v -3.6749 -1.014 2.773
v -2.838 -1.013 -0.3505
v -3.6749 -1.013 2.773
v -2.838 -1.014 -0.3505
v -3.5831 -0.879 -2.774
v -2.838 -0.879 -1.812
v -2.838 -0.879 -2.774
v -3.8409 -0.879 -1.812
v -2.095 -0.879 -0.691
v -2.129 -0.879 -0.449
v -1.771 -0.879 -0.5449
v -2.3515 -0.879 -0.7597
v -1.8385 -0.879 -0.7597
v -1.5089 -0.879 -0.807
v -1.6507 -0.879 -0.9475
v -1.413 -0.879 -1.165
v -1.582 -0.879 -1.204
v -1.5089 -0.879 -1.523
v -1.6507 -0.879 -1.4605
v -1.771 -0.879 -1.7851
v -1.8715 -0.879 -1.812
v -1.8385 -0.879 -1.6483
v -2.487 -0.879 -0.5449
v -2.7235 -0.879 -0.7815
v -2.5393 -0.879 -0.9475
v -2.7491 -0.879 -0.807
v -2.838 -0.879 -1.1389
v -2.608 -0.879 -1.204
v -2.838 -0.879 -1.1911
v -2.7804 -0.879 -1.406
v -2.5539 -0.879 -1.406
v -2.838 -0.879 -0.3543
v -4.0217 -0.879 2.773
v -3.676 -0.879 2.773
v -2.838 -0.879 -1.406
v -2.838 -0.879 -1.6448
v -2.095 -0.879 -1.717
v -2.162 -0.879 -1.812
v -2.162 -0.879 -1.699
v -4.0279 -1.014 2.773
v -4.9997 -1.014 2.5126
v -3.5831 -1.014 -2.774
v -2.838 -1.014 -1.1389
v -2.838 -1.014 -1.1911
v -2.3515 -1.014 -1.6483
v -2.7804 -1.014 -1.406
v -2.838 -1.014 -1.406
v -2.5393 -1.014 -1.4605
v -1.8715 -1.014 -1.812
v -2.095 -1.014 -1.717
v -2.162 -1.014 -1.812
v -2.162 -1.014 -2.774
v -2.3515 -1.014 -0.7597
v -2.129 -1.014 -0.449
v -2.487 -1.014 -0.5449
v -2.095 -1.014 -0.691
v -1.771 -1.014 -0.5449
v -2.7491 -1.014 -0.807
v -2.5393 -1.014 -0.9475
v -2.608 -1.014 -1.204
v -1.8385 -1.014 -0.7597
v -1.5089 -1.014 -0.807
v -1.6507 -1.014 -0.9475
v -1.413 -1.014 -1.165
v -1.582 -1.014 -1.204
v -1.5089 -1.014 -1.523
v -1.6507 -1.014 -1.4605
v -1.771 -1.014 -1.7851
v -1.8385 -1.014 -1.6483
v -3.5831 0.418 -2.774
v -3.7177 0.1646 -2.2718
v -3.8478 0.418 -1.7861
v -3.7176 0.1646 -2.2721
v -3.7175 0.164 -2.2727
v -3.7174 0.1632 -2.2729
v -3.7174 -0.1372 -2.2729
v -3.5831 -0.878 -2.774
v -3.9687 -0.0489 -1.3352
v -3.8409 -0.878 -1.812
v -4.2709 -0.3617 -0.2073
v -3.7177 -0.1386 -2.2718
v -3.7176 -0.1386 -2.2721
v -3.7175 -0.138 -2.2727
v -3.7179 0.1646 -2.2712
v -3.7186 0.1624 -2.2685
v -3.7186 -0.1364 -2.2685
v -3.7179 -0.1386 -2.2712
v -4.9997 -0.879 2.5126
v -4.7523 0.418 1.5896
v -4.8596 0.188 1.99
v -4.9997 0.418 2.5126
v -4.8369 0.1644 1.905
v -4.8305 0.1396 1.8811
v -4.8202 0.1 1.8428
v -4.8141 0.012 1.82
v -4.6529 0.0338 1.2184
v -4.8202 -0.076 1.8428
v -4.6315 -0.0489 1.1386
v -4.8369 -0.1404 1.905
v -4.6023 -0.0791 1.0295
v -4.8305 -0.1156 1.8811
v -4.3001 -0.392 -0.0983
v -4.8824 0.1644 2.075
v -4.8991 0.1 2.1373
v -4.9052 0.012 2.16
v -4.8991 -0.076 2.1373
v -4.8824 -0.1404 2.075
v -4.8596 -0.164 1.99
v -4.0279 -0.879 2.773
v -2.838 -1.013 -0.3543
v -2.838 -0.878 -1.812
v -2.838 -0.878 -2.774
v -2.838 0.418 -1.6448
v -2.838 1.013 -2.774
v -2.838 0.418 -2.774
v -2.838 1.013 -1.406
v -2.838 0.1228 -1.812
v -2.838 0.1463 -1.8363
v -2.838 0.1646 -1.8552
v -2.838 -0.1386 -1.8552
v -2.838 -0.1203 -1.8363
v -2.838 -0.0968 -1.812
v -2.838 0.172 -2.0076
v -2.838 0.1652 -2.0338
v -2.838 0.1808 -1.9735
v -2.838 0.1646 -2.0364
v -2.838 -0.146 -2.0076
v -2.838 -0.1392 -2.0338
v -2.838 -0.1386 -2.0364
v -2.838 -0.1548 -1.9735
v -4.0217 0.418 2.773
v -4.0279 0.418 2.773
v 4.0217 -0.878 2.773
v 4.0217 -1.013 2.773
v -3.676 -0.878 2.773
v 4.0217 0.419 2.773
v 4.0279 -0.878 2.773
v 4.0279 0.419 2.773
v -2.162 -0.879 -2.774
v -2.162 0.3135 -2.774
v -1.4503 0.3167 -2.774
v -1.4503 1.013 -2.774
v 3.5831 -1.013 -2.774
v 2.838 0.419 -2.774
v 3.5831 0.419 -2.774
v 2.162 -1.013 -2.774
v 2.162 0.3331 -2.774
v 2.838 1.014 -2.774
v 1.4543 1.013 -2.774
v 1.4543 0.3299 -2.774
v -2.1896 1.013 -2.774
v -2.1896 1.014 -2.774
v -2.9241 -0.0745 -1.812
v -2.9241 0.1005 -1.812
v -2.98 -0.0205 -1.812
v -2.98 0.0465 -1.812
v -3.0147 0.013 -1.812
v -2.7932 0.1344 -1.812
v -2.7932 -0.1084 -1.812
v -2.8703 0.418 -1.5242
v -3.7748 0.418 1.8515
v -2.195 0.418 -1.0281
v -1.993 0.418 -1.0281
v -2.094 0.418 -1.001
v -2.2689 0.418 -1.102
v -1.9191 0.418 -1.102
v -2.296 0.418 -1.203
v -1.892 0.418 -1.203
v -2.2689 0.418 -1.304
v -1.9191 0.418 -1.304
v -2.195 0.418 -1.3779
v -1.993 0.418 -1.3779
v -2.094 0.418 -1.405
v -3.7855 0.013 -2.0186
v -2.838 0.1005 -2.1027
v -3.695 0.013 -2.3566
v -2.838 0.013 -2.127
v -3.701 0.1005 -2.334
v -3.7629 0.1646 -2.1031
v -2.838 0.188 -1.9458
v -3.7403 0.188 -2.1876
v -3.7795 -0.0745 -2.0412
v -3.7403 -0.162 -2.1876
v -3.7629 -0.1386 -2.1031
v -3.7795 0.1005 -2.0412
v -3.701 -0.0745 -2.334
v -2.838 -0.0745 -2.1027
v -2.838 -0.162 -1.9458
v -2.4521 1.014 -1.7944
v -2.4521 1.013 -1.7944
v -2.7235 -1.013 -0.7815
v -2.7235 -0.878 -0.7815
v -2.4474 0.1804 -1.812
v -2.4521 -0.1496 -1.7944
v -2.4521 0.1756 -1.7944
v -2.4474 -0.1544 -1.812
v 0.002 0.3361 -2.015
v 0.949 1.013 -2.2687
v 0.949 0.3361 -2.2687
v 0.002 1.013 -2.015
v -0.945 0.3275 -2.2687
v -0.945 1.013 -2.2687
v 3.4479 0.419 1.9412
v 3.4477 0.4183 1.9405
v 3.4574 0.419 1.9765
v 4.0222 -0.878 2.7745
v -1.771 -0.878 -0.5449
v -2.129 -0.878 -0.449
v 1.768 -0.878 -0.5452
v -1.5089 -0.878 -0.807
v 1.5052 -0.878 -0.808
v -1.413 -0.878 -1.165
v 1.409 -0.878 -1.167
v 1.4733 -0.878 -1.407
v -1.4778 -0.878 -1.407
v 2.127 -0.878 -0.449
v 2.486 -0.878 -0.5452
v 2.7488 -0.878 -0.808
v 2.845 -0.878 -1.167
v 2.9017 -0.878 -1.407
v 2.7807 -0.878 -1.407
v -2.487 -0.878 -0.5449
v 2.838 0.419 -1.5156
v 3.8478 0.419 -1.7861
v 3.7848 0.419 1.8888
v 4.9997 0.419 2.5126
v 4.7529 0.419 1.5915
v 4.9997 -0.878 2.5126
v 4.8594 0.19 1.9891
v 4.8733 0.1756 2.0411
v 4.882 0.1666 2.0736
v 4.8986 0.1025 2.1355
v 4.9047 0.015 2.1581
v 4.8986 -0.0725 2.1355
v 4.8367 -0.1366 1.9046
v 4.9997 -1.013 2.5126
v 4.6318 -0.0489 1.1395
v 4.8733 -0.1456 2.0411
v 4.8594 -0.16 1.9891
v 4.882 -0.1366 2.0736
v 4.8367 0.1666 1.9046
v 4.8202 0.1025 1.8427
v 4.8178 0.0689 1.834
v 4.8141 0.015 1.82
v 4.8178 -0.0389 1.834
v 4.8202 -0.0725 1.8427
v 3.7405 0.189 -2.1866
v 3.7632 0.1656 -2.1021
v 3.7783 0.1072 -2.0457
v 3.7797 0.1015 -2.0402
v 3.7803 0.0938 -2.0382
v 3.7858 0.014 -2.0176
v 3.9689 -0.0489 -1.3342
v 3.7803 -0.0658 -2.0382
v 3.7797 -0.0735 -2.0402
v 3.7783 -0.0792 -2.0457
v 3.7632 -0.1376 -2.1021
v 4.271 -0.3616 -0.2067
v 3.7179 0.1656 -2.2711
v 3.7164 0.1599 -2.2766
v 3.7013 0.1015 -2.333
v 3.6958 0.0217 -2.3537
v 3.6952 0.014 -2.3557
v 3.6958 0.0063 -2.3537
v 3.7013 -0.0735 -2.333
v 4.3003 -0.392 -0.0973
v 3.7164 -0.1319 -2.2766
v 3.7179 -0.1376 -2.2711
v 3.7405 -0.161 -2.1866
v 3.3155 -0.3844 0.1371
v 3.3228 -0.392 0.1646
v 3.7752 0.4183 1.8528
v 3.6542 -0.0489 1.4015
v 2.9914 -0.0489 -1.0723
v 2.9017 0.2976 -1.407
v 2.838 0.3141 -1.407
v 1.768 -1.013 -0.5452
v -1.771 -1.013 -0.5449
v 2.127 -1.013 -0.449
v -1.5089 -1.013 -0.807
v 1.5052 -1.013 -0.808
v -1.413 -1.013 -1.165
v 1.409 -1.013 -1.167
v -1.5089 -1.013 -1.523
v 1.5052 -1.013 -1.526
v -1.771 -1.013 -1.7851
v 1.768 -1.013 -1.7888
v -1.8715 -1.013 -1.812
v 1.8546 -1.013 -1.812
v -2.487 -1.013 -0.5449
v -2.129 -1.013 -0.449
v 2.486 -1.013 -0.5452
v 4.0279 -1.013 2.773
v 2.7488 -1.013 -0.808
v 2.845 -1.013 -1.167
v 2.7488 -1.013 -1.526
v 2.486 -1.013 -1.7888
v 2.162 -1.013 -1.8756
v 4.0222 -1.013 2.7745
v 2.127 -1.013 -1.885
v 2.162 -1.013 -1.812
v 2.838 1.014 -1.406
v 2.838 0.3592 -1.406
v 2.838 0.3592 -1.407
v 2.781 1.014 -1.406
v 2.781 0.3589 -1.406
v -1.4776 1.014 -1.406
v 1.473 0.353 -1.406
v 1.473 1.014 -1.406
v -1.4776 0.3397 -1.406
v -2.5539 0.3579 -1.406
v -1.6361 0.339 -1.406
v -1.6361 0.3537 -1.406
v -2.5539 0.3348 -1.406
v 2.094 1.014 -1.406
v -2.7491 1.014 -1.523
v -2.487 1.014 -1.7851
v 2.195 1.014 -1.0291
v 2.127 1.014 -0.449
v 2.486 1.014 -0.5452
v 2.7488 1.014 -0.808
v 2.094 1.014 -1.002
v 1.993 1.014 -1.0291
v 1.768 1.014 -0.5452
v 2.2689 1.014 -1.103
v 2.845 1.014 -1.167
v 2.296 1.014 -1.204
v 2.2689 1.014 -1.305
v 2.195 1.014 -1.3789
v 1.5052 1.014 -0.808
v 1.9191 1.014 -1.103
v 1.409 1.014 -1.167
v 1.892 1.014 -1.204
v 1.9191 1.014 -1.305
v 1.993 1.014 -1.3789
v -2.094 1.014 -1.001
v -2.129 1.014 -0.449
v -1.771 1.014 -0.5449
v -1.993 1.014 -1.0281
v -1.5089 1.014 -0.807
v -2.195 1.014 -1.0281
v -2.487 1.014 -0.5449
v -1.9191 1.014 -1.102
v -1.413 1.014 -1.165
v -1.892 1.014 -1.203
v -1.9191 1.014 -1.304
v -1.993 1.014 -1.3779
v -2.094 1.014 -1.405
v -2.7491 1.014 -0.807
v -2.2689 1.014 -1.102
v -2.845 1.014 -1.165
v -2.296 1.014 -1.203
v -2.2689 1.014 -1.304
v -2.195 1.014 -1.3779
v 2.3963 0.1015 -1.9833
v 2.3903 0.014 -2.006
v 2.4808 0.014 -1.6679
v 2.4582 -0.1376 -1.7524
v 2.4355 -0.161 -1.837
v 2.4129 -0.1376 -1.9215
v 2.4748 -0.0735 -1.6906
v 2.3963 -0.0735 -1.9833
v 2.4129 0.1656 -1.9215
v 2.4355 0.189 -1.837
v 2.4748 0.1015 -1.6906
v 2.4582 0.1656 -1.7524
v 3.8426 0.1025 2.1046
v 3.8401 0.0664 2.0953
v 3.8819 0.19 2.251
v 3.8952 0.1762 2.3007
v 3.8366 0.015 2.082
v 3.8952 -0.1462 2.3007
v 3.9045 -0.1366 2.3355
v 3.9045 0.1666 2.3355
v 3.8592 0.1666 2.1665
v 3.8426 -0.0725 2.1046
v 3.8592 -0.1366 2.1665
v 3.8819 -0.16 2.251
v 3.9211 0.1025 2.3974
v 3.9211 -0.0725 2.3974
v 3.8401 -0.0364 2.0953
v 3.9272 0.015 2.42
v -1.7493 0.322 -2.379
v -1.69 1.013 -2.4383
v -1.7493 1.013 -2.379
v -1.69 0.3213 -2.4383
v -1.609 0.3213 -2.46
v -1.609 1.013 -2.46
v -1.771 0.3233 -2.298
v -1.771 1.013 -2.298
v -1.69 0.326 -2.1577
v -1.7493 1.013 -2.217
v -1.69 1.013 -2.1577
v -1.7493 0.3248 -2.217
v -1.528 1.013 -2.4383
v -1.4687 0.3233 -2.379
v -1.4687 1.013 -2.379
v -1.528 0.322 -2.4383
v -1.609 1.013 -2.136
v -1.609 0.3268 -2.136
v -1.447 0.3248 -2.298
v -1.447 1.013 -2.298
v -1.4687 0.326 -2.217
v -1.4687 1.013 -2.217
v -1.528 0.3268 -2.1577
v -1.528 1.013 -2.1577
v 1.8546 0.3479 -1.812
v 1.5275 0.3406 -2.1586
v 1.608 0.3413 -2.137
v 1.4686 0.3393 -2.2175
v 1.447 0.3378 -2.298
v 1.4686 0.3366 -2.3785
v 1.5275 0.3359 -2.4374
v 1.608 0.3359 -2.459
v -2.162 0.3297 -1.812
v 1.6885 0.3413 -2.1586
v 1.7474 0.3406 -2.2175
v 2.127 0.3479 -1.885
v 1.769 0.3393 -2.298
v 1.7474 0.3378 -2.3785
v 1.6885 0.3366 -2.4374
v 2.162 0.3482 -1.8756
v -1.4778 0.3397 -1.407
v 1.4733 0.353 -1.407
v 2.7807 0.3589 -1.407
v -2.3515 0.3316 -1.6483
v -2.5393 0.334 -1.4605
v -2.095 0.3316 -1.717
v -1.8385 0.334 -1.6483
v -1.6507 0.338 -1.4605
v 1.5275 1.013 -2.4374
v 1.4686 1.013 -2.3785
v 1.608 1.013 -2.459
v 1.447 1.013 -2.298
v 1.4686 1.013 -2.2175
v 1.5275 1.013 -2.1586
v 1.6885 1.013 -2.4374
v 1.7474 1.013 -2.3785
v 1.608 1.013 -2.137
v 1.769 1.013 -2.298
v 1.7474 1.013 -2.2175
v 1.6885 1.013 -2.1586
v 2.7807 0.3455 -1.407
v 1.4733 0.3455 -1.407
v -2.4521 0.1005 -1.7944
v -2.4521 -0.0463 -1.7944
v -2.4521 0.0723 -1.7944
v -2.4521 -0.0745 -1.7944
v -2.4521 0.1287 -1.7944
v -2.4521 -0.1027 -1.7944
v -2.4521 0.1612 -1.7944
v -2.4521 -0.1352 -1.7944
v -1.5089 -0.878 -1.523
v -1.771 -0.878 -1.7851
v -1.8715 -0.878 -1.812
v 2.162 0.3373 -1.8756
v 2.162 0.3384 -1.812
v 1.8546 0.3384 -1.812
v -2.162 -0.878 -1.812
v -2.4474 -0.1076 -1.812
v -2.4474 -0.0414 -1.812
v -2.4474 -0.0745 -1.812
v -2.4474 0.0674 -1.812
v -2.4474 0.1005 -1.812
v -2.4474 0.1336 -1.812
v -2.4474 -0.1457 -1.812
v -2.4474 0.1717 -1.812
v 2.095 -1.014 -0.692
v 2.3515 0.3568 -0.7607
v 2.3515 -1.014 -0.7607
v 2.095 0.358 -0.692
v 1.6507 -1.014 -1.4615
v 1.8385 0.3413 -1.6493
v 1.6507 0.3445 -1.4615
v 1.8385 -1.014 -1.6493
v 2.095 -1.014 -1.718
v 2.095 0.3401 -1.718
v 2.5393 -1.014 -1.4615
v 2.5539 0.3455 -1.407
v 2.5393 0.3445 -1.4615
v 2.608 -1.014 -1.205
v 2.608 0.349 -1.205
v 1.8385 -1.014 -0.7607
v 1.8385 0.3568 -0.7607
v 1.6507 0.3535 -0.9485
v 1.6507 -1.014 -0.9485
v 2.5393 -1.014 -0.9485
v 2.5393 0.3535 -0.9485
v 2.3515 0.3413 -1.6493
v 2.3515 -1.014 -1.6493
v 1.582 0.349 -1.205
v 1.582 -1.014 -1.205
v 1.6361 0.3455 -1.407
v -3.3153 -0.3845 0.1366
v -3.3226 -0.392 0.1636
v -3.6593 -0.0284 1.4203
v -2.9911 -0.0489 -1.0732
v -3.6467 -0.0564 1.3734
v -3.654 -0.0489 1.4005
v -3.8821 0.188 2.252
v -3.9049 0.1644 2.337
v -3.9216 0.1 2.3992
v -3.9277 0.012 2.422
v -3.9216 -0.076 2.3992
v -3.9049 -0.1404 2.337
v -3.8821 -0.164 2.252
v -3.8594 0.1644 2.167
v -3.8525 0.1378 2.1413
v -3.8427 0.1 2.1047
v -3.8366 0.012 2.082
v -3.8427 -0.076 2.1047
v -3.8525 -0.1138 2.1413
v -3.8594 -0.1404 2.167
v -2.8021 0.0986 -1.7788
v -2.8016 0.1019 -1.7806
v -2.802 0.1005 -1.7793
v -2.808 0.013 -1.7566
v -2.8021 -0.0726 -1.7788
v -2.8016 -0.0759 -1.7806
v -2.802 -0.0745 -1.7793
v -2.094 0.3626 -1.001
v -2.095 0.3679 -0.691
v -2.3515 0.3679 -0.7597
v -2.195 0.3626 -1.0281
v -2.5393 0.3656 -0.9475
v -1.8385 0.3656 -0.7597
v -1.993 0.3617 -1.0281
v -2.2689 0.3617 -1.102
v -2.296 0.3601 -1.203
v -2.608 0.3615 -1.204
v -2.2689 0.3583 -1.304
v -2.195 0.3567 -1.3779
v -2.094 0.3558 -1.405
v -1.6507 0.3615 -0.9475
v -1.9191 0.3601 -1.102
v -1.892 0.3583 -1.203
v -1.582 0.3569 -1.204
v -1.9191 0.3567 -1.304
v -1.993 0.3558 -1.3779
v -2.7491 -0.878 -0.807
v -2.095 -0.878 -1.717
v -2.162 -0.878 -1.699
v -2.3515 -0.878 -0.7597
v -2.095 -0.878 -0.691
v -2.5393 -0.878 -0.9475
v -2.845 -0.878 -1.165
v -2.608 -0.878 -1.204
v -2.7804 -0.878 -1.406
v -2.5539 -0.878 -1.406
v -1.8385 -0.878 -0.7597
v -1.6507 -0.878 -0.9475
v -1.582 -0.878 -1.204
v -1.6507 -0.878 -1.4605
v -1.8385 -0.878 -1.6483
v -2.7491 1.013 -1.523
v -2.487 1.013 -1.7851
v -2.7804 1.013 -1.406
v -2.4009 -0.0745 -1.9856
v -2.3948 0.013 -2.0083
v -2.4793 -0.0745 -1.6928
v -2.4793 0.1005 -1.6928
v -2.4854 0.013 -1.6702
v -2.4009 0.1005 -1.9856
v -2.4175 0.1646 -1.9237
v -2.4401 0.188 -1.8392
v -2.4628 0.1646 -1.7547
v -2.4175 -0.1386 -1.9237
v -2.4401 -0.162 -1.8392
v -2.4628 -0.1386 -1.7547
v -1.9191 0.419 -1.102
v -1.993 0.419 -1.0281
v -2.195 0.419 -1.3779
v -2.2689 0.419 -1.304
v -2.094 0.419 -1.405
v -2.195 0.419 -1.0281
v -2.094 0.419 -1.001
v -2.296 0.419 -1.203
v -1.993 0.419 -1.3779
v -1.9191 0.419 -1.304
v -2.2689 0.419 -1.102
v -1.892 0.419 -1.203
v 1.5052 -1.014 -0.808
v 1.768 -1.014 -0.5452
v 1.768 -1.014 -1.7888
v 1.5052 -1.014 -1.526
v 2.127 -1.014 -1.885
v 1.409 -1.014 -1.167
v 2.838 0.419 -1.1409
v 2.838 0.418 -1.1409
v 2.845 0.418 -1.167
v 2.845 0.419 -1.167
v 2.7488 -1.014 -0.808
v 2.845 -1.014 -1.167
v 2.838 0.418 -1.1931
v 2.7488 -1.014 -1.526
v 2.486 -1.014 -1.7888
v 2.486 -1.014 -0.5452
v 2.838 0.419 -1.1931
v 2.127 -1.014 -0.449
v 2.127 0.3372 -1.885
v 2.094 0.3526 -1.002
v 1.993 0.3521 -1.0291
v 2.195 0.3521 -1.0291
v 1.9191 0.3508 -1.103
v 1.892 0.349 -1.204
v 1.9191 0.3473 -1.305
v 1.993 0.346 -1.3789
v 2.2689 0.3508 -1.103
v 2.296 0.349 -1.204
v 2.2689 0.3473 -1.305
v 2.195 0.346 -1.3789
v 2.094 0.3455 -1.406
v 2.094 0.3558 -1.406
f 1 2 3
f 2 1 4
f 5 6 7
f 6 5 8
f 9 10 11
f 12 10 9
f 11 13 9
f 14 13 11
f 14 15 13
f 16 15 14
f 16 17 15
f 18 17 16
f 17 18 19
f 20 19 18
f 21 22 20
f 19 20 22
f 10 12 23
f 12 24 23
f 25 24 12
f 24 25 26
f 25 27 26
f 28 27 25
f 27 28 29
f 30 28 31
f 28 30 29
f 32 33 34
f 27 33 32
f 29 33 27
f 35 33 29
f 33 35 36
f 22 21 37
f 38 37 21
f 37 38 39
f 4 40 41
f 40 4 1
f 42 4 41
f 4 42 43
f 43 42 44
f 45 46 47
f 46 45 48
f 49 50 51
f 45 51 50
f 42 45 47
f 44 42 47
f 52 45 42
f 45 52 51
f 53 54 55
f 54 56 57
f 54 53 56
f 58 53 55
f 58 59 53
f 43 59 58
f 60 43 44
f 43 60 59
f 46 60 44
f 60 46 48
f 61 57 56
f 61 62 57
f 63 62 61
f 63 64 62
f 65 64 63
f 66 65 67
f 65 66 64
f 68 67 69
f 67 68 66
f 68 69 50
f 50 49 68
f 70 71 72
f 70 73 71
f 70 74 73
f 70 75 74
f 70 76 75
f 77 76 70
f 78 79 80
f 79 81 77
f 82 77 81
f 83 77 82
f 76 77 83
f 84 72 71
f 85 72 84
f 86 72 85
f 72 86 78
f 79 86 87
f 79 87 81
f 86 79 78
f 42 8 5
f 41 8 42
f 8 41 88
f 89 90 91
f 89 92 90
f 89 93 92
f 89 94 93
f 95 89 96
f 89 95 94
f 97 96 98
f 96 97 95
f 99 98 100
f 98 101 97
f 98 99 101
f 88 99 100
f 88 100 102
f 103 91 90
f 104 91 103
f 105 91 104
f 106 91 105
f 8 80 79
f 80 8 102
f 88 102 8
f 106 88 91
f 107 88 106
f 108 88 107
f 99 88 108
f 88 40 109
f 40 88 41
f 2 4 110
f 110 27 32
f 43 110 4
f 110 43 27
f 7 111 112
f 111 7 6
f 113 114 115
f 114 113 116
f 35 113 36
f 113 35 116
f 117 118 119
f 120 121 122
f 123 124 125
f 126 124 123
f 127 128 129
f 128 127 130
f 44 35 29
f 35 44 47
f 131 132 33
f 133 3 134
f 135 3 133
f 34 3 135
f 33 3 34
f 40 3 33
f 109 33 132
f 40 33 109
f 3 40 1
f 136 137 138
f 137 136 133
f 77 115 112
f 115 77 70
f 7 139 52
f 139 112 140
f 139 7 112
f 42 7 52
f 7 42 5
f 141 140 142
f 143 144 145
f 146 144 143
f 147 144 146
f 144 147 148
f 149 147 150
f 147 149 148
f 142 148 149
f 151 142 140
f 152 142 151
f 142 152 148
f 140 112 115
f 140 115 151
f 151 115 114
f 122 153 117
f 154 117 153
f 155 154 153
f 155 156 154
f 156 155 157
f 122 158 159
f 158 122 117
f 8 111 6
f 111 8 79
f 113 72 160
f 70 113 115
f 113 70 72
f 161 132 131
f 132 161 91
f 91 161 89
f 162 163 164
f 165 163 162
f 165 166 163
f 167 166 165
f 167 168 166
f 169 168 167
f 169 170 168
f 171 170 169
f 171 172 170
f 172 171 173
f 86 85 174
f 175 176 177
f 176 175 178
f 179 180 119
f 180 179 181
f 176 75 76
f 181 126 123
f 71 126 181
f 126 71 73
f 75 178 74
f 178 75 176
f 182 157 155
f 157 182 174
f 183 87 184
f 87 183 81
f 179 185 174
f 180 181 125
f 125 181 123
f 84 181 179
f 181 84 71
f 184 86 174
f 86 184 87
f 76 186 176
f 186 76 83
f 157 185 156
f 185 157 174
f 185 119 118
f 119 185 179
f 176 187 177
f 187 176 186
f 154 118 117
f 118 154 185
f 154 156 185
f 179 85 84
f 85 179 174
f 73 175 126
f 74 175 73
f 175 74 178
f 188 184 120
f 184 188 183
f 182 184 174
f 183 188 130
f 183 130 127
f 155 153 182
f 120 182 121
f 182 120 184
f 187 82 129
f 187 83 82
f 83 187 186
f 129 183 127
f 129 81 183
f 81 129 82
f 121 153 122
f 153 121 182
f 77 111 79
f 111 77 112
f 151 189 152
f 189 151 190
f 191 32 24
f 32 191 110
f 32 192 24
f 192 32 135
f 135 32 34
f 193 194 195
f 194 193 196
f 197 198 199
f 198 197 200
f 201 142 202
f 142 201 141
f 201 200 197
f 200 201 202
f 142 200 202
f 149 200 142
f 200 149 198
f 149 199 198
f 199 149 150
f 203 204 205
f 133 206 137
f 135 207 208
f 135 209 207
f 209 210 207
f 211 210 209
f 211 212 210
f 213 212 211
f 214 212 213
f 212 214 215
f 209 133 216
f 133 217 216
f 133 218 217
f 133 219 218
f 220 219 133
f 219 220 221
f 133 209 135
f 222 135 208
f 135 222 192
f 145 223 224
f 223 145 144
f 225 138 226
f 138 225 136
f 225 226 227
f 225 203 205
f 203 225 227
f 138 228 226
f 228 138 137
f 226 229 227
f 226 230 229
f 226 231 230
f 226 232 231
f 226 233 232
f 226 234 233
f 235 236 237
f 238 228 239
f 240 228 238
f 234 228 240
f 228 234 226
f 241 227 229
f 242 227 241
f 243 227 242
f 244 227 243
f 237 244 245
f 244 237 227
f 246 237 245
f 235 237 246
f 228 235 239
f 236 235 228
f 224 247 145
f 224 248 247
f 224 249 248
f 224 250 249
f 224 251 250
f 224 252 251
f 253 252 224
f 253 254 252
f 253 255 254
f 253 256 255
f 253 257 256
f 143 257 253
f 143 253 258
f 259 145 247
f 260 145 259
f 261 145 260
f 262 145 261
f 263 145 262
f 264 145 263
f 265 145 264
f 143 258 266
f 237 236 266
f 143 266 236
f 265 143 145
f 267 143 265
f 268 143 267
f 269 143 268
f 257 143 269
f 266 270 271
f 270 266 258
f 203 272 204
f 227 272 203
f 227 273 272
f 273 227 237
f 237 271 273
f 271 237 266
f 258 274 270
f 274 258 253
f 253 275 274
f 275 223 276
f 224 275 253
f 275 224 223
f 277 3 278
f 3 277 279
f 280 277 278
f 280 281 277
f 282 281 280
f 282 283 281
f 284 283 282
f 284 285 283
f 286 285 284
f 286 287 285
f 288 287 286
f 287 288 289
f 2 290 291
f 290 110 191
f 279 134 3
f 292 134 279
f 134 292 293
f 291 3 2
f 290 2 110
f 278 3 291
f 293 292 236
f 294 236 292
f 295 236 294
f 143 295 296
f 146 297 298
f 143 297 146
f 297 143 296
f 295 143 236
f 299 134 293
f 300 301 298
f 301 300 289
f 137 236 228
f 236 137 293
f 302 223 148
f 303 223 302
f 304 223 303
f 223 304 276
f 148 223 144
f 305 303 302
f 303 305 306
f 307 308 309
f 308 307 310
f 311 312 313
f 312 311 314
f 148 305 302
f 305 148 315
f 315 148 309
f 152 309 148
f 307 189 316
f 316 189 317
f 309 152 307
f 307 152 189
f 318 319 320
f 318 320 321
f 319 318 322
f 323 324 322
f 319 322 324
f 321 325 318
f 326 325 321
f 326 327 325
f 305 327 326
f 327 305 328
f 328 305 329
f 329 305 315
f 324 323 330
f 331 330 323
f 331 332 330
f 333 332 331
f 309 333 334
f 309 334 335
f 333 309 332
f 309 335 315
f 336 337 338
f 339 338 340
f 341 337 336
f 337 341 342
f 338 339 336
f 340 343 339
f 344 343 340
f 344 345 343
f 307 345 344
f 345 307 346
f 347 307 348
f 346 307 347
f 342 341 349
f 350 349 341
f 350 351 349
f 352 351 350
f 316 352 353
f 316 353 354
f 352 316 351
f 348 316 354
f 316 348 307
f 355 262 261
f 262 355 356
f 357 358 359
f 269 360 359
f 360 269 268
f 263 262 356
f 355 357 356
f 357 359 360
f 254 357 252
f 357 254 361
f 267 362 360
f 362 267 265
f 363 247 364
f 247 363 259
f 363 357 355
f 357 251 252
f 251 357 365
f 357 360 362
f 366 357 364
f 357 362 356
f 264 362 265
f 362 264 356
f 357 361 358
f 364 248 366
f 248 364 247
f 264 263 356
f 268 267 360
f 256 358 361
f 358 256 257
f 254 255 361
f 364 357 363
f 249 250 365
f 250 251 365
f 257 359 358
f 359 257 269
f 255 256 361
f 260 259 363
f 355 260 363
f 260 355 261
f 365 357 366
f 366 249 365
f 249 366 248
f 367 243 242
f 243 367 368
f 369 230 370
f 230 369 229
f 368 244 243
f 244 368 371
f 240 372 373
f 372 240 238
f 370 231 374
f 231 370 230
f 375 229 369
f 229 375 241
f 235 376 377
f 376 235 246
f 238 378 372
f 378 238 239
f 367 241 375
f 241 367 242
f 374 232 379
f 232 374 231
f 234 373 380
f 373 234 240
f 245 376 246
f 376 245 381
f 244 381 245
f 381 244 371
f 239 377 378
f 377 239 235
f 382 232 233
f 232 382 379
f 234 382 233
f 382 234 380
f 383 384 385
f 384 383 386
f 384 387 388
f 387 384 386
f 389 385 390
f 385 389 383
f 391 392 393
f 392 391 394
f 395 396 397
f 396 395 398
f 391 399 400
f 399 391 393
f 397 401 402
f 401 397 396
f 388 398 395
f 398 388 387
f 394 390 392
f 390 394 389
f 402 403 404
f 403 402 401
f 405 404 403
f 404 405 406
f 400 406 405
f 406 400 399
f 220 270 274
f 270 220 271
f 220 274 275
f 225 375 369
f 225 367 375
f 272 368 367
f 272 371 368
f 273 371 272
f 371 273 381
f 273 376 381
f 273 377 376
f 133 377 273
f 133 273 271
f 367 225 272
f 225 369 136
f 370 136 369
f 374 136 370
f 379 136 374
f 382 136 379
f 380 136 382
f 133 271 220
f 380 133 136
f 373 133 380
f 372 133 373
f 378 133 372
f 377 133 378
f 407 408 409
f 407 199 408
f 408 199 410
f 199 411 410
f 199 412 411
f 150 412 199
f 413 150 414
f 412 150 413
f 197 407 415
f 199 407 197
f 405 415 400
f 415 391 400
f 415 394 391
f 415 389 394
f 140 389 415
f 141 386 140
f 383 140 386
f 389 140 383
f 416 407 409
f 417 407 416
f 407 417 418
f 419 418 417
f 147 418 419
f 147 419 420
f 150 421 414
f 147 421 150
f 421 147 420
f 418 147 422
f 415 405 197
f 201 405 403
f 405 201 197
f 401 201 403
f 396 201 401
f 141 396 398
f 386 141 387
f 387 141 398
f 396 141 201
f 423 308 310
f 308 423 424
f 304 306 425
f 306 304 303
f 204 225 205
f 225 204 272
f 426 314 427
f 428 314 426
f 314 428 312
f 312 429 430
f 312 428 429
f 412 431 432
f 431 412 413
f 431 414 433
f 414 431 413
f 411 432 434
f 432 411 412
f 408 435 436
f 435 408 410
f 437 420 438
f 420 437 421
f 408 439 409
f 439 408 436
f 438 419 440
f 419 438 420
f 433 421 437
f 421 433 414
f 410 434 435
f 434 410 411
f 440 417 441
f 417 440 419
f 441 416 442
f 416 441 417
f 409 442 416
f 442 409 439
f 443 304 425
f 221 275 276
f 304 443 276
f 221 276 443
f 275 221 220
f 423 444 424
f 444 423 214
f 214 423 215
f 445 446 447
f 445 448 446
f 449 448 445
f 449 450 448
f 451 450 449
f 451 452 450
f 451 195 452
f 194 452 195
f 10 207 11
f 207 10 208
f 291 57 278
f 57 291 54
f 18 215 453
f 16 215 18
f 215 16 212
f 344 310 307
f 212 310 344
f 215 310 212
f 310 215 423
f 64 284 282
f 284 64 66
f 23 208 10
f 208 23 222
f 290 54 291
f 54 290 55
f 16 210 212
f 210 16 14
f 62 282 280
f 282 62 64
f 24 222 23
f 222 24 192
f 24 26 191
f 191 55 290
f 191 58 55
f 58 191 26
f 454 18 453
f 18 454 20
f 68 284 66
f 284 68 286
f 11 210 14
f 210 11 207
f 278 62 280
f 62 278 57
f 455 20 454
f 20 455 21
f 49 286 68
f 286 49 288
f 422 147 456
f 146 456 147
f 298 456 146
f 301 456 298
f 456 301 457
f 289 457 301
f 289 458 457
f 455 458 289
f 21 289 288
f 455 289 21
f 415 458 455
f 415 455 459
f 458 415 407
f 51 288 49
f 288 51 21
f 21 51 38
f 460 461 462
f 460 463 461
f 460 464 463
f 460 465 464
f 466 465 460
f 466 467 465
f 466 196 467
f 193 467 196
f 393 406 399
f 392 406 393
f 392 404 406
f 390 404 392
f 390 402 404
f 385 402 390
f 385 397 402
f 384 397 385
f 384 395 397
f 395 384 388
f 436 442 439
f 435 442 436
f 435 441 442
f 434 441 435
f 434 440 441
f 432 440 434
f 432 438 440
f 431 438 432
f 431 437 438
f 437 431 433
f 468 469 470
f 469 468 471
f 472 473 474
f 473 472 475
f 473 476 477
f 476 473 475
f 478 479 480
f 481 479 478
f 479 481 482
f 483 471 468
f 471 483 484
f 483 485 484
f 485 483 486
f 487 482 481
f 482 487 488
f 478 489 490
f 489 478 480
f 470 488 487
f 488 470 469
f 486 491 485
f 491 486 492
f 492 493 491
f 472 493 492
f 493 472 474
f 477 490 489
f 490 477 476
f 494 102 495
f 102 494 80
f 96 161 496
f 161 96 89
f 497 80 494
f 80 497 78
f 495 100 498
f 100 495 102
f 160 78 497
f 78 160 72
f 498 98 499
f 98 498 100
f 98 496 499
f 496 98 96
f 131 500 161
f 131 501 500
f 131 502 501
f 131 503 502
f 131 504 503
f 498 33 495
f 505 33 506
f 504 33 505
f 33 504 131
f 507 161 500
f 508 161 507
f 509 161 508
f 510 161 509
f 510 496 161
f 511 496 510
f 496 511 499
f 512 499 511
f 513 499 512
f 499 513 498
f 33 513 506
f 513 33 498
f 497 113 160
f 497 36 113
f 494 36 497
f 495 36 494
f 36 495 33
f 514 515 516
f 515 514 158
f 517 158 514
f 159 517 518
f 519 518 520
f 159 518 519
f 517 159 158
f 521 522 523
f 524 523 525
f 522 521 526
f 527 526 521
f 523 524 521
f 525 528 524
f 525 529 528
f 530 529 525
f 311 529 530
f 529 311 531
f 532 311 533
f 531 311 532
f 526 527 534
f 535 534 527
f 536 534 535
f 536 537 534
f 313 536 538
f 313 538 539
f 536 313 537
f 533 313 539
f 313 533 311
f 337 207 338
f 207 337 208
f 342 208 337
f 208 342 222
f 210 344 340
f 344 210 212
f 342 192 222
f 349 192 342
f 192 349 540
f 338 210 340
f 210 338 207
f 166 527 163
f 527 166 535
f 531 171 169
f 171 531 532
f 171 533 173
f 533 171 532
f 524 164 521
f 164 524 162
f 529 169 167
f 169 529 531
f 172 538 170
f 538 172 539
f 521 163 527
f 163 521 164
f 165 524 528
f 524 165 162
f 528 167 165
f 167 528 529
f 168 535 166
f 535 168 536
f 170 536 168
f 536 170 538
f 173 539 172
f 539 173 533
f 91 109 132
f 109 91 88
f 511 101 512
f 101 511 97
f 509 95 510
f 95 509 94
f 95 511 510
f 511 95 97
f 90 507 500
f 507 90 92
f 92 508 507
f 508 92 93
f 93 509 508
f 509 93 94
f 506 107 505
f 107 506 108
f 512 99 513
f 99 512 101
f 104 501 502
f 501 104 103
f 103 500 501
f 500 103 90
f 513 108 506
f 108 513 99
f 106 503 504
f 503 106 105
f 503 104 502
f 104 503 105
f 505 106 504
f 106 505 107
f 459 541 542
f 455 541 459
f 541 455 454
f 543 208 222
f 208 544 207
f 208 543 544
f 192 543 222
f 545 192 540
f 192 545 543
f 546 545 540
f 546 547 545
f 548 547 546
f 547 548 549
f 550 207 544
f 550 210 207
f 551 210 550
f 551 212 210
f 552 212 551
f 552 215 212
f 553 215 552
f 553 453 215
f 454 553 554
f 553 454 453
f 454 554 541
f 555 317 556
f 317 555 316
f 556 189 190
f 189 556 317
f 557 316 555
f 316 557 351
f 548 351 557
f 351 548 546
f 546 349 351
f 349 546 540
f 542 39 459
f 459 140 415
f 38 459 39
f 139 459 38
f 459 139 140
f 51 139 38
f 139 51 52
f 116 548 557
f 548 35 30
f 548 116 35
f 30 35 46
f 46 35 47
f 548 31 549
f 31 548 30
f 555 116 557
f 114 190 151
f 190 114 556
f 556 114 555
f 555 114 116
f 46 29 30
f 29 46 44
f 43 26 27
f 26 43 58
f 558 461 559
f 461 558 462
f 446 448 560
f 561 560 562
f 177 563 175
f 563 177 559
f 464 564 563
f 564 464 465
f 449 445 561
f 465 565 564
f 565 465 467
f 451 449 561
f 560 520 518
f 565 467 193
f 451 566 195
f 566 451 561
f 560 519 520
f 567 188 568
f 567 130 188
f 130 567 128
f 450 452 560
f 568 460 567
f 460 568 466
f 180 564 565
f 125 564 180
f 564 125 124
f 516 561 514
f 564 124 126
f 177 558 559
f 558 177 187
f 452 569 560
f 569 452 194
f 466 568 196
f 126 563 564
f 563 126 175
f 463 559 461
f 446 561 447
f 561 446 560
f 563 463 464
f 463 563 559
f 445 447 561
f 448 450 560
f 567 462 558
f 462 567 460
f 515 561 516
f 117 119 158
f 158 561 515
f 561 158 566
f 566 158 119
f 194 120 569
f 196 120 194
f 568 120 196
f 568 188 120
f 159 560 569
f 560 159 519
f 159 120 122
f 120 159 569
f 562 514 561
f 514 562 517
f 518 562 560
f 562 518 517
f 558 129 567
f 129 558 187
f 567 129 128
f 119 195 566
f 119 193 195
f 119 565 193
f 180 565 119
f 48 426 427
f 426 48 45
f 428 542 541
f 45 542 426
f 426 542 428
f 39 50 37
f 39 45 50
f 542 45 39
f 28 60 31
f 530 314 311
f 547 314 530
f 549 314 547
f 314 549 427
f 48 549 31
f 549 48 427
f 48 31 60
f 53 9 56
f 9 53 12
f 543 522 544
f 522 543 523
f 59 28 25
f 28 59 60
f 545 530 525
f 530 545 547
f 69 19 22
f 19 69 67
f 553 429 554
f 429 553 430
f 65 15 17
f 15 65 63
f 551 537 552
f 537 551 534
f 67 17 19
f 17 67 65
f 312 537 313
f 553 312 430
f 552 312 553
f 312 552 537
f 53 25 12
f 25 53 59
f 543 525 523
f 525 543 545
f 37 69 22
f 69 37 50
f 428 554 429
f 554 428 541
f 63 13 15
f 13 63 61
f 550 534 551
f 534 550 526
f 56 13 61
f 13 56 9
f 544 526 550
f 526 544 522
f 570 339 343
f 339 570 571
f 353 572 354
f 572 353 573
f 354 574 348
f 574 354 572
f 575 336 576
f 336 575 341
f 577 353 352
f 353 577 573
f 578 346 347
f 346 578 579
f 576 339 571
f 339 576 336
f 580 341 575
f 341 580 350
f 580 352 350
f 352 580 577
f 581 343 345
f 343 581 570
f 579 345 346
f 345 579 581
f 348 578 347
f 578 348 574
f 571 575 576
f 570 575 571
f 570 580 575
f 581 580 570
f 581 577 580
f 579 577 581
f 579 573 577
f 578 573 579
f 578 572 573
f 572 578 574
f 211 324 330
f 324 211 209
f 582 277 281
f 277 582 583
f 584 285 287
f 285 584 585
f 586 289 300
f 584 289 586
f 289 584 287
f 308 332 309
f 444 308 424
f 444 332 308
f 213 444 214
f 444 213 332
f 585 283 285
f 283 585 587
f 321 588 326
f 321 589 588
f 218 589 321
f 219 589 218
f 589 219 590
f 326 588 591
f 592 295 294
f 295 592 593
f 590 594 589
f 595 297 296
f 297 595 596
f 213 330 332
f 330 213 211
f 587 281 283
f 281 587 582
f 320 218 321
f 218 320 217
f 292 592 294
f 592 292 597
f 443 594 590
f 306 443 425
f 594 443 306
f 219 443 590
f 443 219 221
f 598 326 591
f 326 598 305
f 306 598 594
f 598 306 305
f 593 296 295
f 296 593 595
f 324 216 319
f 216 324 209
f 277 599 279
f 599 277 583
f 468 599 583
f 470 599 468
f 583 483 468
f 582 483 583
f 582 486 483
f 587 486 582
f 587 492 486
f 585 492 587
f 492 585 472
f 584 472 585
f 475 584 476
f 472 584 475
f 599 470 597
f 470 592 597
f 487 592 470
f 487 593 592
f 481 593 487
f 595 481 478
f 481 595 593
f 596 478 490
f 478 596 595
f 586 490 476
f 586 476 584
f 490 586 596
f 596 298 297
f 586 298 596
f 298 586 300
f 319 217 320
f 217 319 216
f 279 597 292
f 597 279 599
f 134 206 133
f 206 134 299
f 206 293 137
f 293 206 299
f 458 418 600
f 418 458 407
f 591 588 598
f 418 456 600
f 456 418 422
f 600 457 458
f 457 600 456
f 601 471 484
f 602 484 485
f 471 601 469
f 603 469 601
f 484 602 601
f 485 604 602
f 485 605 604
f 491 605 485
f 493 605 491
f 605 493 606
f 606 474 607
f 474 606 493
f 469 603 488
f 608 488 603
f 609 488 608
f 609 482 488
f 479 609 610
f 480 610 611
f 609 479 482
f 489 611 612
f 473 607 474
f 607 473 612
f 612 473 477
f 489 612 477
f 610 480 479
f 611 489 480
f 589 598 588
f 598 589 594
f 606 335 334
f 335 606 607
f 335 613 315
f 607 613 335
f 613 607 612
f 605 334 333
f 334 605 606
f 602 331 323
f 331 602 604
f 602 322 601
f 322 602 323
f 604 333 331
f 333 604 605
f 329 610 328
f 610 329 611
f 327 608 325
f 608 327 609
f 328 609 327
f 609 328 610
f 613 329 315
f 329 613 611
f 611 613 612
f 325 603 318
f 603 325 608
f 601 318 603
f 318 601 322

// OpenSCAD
intersection() {
translate([-6, -1.216, -3.329]) cube(size = [12, 2.432, 6.658], center = false);
union() {
intersection() {
union() {
intersection() {
difference() {
rotate([-90, -15, 0])
translate([-4.179, -3.721, -1.014]) cube(size = [1.347, 21.821, 0.135], center = false);
rotate([179, 0, 0])
translate([-2.838, -0.37, -18.1]) cube(size = [0.676, 18.47, 36.2], center = false);
}
union() {
translate([-2.162, -1.013, -18.1]) cube(size = [20.262, 19.114, 16.288], center = false);
translate([-18.1, -18.1, -2.774]) cube(size = [15.938, 19.114, 5.547], center = false);
}
}
difference() {
difference() {
translate([-18.1, -1.014, -2.774]) cube(size = [15.262, 1.432, 0.962], center = false);
rotate([0, 75, 0])
translate([1.145, 0.013, -4.179])
cylinder(h = 1.347, r1 = 0.175, r2 = 0.175, center = false, $fn = 12);
}
difference() {
translate([-18.1, -1.014, -2.774]) cube(size = [36.2, 1.432, 5.547], center = false);
rotate([-90, -15, 0])
translate([-4.179, -3.721, -0.878]) cube(size = [1.347, 21.821, 1.297], center = false);
}
}
}
translate([-18.1, -18.1, -2.774]) cube(size = [36.2, 36.2, 5.547], center = false);
}
difference() {
intersection() {
difference() {
rotate([-91, -15, 0])
translate([-2.833, -18.1, -18.1]) cube(size = [20.933, 36.2, 36.2], center = false);
rotate([180, 90, -90])
translate([3.909, -0.002, -1.014])
cylinder(h = 2.027, r1 = 1.894, r2 = 1.894, center = false, $fn = 12);
}
union() {
rotate([90, 15, 0])
translate([-18.1, -18.1, 0.878]) cube(size = [22.279, 21.821, 0.135], center = false);
translate([-18.1, -0.878, -2.774]) cube(size = [20.938, 1.892, 1.368], center = false);
difference() {
rotate([90, 15, 0])
translate([2.828, -18.1, -0.419]) cube(size = [1.351, 21.821, 1.297], center = false);
rotate([180, 75, 180])
translate([-1.019, 2.169, 2.828])
cylinder(h = 15.272, r1 = 2.561, r2 = 2.561, center = false, $fn = 12);
}
}
difference() {
translate([-18.1, -18.1, -2.774]) cube(size = [36.2, 36.2, 5.547], center = false);
rotate([180, 75, 180])
translate([1.144, 0.014, 2.828])
cylinder(h = 15.272, r1 = 0.175, r2 = 0.175, center = false, $fn = 12);
}
}
intersection() {
union() {
rotate([180, 75, 180])
translate([-3.179, 0.015, -18.1])
cylinder(h = 36.2, r1 = 0.175, r2 = 0.175, center = false, $fn = 12);
rotate([180, 90, -90])
translate([2.298, 1.609, -0.878])
cylinder(h = 18.978, r1 = 0.162, r2 = 0.162, center = false, $fn = 12);
rotate([89, 15, 0])
translate([-18.1, -18.1, -0.37]) cube(size = [21.267, 36.2, 18.47], center = false);
rotate([180, 90, -90])
translate([2.298, -1.608, -0.878])
cylinder(h = 18.978, r1 = 0.161, r2 = 0.161, center = false, $fn = 12);
}
union() {
translate([-18.1, -0.878, -1.407]) cube(size = [36.2, 1.892, 4.18], center = false);
rotate([180, 90, -90])
translate([1.165, 2.129, -18.1])
cylinder(h = 36.2, r1 = 0.716, r2 = 0.716, center = false, $fn = 12);
translate([-18.1, -1.014, -2.774]) cube(size = [20.262, 2.027, 0.962], center = false);
rotate([180, 90, -90])
translate([1.205, -2.095, -18.1])
cylinder(h = 19.114, r1 = 0.513, r2 = 0.513, center = false, $fn = 12);
}
}
}
intersection() {
difference() {
translate([-18.1, -1.014, -1.812]) cube(size = [36.2, 1.432, 4.585], center = false);
rotate([0, 75, 0])
translate([-1.018, 2.169, -18.1])
cylinder(h = 15.267, r1 = 2.561, r2 = 2.561, center = false, $fn = 12);
}
union() {
rotate([-90, -15, 0])
translate([-4.179, -18.1, -1.014]) cube(size = [1.012, 36.2, 1.432], center = false);
rotate([-91, -15, 0])
translate([-2.833, -18.1, 0.37]) cube(size = [20.933, 36.2, 17.73], center = false);
}
union() {
difference() {
rotate([180, 90, -90])
translate([1.165, 2.129, -0.878])
cylinder(h = 18.978, r1 = 0.716, r2 = 0.716, center = false, $fn = 12);
rotate([180, 90, -90])
translate([1.203, 2.094, -18.1])
cylinder(h = 18.519, r1 = 0.202, r2 = 0.202, center = false, $fn = 12);
}
difference() {
rotate([-90, -15, 0])
translate([-4.179, -3.721, -1.014]) cube(size = [1.012, 21.821, 1.432], center = false);
rotate([0, 75, 0])
translate([-3.18, 0.012, -18.1])
cylinder(h = 36.2, r1 = 0.176, r2 = 0.176, center = false, $fn = 12);
}
}
}
difference() {
union() {
translate([-2.838, -1.014, -2.774]) cube(size = [0.676, 2.027, 1.368], center = false);
rotate([180, 90, -90])
translate([1.165, 2.129, -1.014])
cylinder(h = 0.135, r1 = 0.716, r2 = 0.716, center = false, $fn = 12);
difference() {
rotate([180, 90, -90])
translate([1.165, 2.129, -0.878])
cylinder(h = 1.892, r1 = 0.716, r2 = 0.716, center = false, $fn = 12);
translate([-2.162, -0.878, -2.774]) cube(size = [20.262, 1.297, 0.962], center = false);
}
}
union() {
rotate([0, 75, 0])
translate([1.145, 0.013, -18.1])
cylinder(h = 15.267, r1 = 0.175, r2 = 0.175, center = false, $fn = 12);
translate([-2.162, -1.014, -2.774]) cube(size = [20.262, 0.135, 0.962], center = false);
rotate([180, 90, -90])
translate([1.204, 2.095, -1.014])
cylinder(h = 1.432, r1 = 0.513, r2 = 0.513, center = false, $fn = 12);
rotate([180, 90, -90])
translate([1.203, 2.094, 0.419])
cylinder(h = 0.595, r1 = 0.202, r2 = 0.202, center = false, $fn = 12);
}
}
difference() {
union() {
rotate([180, 90, -90])
translate([1.167, -2.127, -1.014])
cylinder(h = 1.432, r1 = 0.718, r2 = 0.718, center = false, $fn = 12);
rotate([90, 15, 0])
translate([3.167, -18.1, 0.878]) cube(size = [1.012, 21.821, 0.135], center = false);
}
union() {
translate([-18.1, -1.013, -18.1]) cube(size = [36.2, 19.114, 16.693], center = false);
rotate([180, 90, -90])
translate([1.205, -2.095, -1.014])
cylinder(h = 1.432, r1 = 0.513, r2 = 0.513, center = false, $fn = 12);
}
}
difference() {
intersection() {
rotate([180, 90, -90])
translate([1.167, -2.127, -0.878])
cylinder(h = 1.297, r1 = 0.718, r2 = 0.718, center = false, $fn = 12);
rotate([179, 0, 0])
translate([-18.1, -18.1, -18.1]) cube(size = [36.2, 17.73, 36.2], center = false);
rotate([179, 0, 0])
translate([-18.1, -18.1, -18.1]) cube(size = [20.938, 17.73, 36.2], center = false);
}
difference() {
intersection() {
rotate([180, 90, -90])
translate([1.205, -2.095, -18.1])
cylinder(h = 19.114, r1 = 0.513, r2 = 0.513, center = false, $fn = 12);
rotate([180, 90, -90])
translate([1.204, -2.094, -0.878])
cylinder(h = 18.978, r1 = 0.202, r2 = 0.202, center = false, $fn = 12);
}
translate([2.162, -0.878, -18.1]) cube(size = [0.676, 1.892, 15.326], center = false);
}
}
difference() {
union() {
rotate([180, 90, -90])
translate([1.167, -2.127, 0.419])
cylinder(h = 0.595, r1 = 0.718, r2 = 0.718, center = false, $fn = 12);
translate([2.162, 0.419, -2.774]) cube(size = [0.676, 0.595, 1.368], center = false);
}
union() {
translate([2.162, -0.878, -1.812]) cube(size = [0.676, 1.297, 0.405], center = false);
rotate([180, 90, -90])
translate([1.204, -2.094, 0.419])
cylinder(h = 0.595, r1 = 0.202, r2 = 0.202, center = false, $fn = 12);
}
}
}
}
